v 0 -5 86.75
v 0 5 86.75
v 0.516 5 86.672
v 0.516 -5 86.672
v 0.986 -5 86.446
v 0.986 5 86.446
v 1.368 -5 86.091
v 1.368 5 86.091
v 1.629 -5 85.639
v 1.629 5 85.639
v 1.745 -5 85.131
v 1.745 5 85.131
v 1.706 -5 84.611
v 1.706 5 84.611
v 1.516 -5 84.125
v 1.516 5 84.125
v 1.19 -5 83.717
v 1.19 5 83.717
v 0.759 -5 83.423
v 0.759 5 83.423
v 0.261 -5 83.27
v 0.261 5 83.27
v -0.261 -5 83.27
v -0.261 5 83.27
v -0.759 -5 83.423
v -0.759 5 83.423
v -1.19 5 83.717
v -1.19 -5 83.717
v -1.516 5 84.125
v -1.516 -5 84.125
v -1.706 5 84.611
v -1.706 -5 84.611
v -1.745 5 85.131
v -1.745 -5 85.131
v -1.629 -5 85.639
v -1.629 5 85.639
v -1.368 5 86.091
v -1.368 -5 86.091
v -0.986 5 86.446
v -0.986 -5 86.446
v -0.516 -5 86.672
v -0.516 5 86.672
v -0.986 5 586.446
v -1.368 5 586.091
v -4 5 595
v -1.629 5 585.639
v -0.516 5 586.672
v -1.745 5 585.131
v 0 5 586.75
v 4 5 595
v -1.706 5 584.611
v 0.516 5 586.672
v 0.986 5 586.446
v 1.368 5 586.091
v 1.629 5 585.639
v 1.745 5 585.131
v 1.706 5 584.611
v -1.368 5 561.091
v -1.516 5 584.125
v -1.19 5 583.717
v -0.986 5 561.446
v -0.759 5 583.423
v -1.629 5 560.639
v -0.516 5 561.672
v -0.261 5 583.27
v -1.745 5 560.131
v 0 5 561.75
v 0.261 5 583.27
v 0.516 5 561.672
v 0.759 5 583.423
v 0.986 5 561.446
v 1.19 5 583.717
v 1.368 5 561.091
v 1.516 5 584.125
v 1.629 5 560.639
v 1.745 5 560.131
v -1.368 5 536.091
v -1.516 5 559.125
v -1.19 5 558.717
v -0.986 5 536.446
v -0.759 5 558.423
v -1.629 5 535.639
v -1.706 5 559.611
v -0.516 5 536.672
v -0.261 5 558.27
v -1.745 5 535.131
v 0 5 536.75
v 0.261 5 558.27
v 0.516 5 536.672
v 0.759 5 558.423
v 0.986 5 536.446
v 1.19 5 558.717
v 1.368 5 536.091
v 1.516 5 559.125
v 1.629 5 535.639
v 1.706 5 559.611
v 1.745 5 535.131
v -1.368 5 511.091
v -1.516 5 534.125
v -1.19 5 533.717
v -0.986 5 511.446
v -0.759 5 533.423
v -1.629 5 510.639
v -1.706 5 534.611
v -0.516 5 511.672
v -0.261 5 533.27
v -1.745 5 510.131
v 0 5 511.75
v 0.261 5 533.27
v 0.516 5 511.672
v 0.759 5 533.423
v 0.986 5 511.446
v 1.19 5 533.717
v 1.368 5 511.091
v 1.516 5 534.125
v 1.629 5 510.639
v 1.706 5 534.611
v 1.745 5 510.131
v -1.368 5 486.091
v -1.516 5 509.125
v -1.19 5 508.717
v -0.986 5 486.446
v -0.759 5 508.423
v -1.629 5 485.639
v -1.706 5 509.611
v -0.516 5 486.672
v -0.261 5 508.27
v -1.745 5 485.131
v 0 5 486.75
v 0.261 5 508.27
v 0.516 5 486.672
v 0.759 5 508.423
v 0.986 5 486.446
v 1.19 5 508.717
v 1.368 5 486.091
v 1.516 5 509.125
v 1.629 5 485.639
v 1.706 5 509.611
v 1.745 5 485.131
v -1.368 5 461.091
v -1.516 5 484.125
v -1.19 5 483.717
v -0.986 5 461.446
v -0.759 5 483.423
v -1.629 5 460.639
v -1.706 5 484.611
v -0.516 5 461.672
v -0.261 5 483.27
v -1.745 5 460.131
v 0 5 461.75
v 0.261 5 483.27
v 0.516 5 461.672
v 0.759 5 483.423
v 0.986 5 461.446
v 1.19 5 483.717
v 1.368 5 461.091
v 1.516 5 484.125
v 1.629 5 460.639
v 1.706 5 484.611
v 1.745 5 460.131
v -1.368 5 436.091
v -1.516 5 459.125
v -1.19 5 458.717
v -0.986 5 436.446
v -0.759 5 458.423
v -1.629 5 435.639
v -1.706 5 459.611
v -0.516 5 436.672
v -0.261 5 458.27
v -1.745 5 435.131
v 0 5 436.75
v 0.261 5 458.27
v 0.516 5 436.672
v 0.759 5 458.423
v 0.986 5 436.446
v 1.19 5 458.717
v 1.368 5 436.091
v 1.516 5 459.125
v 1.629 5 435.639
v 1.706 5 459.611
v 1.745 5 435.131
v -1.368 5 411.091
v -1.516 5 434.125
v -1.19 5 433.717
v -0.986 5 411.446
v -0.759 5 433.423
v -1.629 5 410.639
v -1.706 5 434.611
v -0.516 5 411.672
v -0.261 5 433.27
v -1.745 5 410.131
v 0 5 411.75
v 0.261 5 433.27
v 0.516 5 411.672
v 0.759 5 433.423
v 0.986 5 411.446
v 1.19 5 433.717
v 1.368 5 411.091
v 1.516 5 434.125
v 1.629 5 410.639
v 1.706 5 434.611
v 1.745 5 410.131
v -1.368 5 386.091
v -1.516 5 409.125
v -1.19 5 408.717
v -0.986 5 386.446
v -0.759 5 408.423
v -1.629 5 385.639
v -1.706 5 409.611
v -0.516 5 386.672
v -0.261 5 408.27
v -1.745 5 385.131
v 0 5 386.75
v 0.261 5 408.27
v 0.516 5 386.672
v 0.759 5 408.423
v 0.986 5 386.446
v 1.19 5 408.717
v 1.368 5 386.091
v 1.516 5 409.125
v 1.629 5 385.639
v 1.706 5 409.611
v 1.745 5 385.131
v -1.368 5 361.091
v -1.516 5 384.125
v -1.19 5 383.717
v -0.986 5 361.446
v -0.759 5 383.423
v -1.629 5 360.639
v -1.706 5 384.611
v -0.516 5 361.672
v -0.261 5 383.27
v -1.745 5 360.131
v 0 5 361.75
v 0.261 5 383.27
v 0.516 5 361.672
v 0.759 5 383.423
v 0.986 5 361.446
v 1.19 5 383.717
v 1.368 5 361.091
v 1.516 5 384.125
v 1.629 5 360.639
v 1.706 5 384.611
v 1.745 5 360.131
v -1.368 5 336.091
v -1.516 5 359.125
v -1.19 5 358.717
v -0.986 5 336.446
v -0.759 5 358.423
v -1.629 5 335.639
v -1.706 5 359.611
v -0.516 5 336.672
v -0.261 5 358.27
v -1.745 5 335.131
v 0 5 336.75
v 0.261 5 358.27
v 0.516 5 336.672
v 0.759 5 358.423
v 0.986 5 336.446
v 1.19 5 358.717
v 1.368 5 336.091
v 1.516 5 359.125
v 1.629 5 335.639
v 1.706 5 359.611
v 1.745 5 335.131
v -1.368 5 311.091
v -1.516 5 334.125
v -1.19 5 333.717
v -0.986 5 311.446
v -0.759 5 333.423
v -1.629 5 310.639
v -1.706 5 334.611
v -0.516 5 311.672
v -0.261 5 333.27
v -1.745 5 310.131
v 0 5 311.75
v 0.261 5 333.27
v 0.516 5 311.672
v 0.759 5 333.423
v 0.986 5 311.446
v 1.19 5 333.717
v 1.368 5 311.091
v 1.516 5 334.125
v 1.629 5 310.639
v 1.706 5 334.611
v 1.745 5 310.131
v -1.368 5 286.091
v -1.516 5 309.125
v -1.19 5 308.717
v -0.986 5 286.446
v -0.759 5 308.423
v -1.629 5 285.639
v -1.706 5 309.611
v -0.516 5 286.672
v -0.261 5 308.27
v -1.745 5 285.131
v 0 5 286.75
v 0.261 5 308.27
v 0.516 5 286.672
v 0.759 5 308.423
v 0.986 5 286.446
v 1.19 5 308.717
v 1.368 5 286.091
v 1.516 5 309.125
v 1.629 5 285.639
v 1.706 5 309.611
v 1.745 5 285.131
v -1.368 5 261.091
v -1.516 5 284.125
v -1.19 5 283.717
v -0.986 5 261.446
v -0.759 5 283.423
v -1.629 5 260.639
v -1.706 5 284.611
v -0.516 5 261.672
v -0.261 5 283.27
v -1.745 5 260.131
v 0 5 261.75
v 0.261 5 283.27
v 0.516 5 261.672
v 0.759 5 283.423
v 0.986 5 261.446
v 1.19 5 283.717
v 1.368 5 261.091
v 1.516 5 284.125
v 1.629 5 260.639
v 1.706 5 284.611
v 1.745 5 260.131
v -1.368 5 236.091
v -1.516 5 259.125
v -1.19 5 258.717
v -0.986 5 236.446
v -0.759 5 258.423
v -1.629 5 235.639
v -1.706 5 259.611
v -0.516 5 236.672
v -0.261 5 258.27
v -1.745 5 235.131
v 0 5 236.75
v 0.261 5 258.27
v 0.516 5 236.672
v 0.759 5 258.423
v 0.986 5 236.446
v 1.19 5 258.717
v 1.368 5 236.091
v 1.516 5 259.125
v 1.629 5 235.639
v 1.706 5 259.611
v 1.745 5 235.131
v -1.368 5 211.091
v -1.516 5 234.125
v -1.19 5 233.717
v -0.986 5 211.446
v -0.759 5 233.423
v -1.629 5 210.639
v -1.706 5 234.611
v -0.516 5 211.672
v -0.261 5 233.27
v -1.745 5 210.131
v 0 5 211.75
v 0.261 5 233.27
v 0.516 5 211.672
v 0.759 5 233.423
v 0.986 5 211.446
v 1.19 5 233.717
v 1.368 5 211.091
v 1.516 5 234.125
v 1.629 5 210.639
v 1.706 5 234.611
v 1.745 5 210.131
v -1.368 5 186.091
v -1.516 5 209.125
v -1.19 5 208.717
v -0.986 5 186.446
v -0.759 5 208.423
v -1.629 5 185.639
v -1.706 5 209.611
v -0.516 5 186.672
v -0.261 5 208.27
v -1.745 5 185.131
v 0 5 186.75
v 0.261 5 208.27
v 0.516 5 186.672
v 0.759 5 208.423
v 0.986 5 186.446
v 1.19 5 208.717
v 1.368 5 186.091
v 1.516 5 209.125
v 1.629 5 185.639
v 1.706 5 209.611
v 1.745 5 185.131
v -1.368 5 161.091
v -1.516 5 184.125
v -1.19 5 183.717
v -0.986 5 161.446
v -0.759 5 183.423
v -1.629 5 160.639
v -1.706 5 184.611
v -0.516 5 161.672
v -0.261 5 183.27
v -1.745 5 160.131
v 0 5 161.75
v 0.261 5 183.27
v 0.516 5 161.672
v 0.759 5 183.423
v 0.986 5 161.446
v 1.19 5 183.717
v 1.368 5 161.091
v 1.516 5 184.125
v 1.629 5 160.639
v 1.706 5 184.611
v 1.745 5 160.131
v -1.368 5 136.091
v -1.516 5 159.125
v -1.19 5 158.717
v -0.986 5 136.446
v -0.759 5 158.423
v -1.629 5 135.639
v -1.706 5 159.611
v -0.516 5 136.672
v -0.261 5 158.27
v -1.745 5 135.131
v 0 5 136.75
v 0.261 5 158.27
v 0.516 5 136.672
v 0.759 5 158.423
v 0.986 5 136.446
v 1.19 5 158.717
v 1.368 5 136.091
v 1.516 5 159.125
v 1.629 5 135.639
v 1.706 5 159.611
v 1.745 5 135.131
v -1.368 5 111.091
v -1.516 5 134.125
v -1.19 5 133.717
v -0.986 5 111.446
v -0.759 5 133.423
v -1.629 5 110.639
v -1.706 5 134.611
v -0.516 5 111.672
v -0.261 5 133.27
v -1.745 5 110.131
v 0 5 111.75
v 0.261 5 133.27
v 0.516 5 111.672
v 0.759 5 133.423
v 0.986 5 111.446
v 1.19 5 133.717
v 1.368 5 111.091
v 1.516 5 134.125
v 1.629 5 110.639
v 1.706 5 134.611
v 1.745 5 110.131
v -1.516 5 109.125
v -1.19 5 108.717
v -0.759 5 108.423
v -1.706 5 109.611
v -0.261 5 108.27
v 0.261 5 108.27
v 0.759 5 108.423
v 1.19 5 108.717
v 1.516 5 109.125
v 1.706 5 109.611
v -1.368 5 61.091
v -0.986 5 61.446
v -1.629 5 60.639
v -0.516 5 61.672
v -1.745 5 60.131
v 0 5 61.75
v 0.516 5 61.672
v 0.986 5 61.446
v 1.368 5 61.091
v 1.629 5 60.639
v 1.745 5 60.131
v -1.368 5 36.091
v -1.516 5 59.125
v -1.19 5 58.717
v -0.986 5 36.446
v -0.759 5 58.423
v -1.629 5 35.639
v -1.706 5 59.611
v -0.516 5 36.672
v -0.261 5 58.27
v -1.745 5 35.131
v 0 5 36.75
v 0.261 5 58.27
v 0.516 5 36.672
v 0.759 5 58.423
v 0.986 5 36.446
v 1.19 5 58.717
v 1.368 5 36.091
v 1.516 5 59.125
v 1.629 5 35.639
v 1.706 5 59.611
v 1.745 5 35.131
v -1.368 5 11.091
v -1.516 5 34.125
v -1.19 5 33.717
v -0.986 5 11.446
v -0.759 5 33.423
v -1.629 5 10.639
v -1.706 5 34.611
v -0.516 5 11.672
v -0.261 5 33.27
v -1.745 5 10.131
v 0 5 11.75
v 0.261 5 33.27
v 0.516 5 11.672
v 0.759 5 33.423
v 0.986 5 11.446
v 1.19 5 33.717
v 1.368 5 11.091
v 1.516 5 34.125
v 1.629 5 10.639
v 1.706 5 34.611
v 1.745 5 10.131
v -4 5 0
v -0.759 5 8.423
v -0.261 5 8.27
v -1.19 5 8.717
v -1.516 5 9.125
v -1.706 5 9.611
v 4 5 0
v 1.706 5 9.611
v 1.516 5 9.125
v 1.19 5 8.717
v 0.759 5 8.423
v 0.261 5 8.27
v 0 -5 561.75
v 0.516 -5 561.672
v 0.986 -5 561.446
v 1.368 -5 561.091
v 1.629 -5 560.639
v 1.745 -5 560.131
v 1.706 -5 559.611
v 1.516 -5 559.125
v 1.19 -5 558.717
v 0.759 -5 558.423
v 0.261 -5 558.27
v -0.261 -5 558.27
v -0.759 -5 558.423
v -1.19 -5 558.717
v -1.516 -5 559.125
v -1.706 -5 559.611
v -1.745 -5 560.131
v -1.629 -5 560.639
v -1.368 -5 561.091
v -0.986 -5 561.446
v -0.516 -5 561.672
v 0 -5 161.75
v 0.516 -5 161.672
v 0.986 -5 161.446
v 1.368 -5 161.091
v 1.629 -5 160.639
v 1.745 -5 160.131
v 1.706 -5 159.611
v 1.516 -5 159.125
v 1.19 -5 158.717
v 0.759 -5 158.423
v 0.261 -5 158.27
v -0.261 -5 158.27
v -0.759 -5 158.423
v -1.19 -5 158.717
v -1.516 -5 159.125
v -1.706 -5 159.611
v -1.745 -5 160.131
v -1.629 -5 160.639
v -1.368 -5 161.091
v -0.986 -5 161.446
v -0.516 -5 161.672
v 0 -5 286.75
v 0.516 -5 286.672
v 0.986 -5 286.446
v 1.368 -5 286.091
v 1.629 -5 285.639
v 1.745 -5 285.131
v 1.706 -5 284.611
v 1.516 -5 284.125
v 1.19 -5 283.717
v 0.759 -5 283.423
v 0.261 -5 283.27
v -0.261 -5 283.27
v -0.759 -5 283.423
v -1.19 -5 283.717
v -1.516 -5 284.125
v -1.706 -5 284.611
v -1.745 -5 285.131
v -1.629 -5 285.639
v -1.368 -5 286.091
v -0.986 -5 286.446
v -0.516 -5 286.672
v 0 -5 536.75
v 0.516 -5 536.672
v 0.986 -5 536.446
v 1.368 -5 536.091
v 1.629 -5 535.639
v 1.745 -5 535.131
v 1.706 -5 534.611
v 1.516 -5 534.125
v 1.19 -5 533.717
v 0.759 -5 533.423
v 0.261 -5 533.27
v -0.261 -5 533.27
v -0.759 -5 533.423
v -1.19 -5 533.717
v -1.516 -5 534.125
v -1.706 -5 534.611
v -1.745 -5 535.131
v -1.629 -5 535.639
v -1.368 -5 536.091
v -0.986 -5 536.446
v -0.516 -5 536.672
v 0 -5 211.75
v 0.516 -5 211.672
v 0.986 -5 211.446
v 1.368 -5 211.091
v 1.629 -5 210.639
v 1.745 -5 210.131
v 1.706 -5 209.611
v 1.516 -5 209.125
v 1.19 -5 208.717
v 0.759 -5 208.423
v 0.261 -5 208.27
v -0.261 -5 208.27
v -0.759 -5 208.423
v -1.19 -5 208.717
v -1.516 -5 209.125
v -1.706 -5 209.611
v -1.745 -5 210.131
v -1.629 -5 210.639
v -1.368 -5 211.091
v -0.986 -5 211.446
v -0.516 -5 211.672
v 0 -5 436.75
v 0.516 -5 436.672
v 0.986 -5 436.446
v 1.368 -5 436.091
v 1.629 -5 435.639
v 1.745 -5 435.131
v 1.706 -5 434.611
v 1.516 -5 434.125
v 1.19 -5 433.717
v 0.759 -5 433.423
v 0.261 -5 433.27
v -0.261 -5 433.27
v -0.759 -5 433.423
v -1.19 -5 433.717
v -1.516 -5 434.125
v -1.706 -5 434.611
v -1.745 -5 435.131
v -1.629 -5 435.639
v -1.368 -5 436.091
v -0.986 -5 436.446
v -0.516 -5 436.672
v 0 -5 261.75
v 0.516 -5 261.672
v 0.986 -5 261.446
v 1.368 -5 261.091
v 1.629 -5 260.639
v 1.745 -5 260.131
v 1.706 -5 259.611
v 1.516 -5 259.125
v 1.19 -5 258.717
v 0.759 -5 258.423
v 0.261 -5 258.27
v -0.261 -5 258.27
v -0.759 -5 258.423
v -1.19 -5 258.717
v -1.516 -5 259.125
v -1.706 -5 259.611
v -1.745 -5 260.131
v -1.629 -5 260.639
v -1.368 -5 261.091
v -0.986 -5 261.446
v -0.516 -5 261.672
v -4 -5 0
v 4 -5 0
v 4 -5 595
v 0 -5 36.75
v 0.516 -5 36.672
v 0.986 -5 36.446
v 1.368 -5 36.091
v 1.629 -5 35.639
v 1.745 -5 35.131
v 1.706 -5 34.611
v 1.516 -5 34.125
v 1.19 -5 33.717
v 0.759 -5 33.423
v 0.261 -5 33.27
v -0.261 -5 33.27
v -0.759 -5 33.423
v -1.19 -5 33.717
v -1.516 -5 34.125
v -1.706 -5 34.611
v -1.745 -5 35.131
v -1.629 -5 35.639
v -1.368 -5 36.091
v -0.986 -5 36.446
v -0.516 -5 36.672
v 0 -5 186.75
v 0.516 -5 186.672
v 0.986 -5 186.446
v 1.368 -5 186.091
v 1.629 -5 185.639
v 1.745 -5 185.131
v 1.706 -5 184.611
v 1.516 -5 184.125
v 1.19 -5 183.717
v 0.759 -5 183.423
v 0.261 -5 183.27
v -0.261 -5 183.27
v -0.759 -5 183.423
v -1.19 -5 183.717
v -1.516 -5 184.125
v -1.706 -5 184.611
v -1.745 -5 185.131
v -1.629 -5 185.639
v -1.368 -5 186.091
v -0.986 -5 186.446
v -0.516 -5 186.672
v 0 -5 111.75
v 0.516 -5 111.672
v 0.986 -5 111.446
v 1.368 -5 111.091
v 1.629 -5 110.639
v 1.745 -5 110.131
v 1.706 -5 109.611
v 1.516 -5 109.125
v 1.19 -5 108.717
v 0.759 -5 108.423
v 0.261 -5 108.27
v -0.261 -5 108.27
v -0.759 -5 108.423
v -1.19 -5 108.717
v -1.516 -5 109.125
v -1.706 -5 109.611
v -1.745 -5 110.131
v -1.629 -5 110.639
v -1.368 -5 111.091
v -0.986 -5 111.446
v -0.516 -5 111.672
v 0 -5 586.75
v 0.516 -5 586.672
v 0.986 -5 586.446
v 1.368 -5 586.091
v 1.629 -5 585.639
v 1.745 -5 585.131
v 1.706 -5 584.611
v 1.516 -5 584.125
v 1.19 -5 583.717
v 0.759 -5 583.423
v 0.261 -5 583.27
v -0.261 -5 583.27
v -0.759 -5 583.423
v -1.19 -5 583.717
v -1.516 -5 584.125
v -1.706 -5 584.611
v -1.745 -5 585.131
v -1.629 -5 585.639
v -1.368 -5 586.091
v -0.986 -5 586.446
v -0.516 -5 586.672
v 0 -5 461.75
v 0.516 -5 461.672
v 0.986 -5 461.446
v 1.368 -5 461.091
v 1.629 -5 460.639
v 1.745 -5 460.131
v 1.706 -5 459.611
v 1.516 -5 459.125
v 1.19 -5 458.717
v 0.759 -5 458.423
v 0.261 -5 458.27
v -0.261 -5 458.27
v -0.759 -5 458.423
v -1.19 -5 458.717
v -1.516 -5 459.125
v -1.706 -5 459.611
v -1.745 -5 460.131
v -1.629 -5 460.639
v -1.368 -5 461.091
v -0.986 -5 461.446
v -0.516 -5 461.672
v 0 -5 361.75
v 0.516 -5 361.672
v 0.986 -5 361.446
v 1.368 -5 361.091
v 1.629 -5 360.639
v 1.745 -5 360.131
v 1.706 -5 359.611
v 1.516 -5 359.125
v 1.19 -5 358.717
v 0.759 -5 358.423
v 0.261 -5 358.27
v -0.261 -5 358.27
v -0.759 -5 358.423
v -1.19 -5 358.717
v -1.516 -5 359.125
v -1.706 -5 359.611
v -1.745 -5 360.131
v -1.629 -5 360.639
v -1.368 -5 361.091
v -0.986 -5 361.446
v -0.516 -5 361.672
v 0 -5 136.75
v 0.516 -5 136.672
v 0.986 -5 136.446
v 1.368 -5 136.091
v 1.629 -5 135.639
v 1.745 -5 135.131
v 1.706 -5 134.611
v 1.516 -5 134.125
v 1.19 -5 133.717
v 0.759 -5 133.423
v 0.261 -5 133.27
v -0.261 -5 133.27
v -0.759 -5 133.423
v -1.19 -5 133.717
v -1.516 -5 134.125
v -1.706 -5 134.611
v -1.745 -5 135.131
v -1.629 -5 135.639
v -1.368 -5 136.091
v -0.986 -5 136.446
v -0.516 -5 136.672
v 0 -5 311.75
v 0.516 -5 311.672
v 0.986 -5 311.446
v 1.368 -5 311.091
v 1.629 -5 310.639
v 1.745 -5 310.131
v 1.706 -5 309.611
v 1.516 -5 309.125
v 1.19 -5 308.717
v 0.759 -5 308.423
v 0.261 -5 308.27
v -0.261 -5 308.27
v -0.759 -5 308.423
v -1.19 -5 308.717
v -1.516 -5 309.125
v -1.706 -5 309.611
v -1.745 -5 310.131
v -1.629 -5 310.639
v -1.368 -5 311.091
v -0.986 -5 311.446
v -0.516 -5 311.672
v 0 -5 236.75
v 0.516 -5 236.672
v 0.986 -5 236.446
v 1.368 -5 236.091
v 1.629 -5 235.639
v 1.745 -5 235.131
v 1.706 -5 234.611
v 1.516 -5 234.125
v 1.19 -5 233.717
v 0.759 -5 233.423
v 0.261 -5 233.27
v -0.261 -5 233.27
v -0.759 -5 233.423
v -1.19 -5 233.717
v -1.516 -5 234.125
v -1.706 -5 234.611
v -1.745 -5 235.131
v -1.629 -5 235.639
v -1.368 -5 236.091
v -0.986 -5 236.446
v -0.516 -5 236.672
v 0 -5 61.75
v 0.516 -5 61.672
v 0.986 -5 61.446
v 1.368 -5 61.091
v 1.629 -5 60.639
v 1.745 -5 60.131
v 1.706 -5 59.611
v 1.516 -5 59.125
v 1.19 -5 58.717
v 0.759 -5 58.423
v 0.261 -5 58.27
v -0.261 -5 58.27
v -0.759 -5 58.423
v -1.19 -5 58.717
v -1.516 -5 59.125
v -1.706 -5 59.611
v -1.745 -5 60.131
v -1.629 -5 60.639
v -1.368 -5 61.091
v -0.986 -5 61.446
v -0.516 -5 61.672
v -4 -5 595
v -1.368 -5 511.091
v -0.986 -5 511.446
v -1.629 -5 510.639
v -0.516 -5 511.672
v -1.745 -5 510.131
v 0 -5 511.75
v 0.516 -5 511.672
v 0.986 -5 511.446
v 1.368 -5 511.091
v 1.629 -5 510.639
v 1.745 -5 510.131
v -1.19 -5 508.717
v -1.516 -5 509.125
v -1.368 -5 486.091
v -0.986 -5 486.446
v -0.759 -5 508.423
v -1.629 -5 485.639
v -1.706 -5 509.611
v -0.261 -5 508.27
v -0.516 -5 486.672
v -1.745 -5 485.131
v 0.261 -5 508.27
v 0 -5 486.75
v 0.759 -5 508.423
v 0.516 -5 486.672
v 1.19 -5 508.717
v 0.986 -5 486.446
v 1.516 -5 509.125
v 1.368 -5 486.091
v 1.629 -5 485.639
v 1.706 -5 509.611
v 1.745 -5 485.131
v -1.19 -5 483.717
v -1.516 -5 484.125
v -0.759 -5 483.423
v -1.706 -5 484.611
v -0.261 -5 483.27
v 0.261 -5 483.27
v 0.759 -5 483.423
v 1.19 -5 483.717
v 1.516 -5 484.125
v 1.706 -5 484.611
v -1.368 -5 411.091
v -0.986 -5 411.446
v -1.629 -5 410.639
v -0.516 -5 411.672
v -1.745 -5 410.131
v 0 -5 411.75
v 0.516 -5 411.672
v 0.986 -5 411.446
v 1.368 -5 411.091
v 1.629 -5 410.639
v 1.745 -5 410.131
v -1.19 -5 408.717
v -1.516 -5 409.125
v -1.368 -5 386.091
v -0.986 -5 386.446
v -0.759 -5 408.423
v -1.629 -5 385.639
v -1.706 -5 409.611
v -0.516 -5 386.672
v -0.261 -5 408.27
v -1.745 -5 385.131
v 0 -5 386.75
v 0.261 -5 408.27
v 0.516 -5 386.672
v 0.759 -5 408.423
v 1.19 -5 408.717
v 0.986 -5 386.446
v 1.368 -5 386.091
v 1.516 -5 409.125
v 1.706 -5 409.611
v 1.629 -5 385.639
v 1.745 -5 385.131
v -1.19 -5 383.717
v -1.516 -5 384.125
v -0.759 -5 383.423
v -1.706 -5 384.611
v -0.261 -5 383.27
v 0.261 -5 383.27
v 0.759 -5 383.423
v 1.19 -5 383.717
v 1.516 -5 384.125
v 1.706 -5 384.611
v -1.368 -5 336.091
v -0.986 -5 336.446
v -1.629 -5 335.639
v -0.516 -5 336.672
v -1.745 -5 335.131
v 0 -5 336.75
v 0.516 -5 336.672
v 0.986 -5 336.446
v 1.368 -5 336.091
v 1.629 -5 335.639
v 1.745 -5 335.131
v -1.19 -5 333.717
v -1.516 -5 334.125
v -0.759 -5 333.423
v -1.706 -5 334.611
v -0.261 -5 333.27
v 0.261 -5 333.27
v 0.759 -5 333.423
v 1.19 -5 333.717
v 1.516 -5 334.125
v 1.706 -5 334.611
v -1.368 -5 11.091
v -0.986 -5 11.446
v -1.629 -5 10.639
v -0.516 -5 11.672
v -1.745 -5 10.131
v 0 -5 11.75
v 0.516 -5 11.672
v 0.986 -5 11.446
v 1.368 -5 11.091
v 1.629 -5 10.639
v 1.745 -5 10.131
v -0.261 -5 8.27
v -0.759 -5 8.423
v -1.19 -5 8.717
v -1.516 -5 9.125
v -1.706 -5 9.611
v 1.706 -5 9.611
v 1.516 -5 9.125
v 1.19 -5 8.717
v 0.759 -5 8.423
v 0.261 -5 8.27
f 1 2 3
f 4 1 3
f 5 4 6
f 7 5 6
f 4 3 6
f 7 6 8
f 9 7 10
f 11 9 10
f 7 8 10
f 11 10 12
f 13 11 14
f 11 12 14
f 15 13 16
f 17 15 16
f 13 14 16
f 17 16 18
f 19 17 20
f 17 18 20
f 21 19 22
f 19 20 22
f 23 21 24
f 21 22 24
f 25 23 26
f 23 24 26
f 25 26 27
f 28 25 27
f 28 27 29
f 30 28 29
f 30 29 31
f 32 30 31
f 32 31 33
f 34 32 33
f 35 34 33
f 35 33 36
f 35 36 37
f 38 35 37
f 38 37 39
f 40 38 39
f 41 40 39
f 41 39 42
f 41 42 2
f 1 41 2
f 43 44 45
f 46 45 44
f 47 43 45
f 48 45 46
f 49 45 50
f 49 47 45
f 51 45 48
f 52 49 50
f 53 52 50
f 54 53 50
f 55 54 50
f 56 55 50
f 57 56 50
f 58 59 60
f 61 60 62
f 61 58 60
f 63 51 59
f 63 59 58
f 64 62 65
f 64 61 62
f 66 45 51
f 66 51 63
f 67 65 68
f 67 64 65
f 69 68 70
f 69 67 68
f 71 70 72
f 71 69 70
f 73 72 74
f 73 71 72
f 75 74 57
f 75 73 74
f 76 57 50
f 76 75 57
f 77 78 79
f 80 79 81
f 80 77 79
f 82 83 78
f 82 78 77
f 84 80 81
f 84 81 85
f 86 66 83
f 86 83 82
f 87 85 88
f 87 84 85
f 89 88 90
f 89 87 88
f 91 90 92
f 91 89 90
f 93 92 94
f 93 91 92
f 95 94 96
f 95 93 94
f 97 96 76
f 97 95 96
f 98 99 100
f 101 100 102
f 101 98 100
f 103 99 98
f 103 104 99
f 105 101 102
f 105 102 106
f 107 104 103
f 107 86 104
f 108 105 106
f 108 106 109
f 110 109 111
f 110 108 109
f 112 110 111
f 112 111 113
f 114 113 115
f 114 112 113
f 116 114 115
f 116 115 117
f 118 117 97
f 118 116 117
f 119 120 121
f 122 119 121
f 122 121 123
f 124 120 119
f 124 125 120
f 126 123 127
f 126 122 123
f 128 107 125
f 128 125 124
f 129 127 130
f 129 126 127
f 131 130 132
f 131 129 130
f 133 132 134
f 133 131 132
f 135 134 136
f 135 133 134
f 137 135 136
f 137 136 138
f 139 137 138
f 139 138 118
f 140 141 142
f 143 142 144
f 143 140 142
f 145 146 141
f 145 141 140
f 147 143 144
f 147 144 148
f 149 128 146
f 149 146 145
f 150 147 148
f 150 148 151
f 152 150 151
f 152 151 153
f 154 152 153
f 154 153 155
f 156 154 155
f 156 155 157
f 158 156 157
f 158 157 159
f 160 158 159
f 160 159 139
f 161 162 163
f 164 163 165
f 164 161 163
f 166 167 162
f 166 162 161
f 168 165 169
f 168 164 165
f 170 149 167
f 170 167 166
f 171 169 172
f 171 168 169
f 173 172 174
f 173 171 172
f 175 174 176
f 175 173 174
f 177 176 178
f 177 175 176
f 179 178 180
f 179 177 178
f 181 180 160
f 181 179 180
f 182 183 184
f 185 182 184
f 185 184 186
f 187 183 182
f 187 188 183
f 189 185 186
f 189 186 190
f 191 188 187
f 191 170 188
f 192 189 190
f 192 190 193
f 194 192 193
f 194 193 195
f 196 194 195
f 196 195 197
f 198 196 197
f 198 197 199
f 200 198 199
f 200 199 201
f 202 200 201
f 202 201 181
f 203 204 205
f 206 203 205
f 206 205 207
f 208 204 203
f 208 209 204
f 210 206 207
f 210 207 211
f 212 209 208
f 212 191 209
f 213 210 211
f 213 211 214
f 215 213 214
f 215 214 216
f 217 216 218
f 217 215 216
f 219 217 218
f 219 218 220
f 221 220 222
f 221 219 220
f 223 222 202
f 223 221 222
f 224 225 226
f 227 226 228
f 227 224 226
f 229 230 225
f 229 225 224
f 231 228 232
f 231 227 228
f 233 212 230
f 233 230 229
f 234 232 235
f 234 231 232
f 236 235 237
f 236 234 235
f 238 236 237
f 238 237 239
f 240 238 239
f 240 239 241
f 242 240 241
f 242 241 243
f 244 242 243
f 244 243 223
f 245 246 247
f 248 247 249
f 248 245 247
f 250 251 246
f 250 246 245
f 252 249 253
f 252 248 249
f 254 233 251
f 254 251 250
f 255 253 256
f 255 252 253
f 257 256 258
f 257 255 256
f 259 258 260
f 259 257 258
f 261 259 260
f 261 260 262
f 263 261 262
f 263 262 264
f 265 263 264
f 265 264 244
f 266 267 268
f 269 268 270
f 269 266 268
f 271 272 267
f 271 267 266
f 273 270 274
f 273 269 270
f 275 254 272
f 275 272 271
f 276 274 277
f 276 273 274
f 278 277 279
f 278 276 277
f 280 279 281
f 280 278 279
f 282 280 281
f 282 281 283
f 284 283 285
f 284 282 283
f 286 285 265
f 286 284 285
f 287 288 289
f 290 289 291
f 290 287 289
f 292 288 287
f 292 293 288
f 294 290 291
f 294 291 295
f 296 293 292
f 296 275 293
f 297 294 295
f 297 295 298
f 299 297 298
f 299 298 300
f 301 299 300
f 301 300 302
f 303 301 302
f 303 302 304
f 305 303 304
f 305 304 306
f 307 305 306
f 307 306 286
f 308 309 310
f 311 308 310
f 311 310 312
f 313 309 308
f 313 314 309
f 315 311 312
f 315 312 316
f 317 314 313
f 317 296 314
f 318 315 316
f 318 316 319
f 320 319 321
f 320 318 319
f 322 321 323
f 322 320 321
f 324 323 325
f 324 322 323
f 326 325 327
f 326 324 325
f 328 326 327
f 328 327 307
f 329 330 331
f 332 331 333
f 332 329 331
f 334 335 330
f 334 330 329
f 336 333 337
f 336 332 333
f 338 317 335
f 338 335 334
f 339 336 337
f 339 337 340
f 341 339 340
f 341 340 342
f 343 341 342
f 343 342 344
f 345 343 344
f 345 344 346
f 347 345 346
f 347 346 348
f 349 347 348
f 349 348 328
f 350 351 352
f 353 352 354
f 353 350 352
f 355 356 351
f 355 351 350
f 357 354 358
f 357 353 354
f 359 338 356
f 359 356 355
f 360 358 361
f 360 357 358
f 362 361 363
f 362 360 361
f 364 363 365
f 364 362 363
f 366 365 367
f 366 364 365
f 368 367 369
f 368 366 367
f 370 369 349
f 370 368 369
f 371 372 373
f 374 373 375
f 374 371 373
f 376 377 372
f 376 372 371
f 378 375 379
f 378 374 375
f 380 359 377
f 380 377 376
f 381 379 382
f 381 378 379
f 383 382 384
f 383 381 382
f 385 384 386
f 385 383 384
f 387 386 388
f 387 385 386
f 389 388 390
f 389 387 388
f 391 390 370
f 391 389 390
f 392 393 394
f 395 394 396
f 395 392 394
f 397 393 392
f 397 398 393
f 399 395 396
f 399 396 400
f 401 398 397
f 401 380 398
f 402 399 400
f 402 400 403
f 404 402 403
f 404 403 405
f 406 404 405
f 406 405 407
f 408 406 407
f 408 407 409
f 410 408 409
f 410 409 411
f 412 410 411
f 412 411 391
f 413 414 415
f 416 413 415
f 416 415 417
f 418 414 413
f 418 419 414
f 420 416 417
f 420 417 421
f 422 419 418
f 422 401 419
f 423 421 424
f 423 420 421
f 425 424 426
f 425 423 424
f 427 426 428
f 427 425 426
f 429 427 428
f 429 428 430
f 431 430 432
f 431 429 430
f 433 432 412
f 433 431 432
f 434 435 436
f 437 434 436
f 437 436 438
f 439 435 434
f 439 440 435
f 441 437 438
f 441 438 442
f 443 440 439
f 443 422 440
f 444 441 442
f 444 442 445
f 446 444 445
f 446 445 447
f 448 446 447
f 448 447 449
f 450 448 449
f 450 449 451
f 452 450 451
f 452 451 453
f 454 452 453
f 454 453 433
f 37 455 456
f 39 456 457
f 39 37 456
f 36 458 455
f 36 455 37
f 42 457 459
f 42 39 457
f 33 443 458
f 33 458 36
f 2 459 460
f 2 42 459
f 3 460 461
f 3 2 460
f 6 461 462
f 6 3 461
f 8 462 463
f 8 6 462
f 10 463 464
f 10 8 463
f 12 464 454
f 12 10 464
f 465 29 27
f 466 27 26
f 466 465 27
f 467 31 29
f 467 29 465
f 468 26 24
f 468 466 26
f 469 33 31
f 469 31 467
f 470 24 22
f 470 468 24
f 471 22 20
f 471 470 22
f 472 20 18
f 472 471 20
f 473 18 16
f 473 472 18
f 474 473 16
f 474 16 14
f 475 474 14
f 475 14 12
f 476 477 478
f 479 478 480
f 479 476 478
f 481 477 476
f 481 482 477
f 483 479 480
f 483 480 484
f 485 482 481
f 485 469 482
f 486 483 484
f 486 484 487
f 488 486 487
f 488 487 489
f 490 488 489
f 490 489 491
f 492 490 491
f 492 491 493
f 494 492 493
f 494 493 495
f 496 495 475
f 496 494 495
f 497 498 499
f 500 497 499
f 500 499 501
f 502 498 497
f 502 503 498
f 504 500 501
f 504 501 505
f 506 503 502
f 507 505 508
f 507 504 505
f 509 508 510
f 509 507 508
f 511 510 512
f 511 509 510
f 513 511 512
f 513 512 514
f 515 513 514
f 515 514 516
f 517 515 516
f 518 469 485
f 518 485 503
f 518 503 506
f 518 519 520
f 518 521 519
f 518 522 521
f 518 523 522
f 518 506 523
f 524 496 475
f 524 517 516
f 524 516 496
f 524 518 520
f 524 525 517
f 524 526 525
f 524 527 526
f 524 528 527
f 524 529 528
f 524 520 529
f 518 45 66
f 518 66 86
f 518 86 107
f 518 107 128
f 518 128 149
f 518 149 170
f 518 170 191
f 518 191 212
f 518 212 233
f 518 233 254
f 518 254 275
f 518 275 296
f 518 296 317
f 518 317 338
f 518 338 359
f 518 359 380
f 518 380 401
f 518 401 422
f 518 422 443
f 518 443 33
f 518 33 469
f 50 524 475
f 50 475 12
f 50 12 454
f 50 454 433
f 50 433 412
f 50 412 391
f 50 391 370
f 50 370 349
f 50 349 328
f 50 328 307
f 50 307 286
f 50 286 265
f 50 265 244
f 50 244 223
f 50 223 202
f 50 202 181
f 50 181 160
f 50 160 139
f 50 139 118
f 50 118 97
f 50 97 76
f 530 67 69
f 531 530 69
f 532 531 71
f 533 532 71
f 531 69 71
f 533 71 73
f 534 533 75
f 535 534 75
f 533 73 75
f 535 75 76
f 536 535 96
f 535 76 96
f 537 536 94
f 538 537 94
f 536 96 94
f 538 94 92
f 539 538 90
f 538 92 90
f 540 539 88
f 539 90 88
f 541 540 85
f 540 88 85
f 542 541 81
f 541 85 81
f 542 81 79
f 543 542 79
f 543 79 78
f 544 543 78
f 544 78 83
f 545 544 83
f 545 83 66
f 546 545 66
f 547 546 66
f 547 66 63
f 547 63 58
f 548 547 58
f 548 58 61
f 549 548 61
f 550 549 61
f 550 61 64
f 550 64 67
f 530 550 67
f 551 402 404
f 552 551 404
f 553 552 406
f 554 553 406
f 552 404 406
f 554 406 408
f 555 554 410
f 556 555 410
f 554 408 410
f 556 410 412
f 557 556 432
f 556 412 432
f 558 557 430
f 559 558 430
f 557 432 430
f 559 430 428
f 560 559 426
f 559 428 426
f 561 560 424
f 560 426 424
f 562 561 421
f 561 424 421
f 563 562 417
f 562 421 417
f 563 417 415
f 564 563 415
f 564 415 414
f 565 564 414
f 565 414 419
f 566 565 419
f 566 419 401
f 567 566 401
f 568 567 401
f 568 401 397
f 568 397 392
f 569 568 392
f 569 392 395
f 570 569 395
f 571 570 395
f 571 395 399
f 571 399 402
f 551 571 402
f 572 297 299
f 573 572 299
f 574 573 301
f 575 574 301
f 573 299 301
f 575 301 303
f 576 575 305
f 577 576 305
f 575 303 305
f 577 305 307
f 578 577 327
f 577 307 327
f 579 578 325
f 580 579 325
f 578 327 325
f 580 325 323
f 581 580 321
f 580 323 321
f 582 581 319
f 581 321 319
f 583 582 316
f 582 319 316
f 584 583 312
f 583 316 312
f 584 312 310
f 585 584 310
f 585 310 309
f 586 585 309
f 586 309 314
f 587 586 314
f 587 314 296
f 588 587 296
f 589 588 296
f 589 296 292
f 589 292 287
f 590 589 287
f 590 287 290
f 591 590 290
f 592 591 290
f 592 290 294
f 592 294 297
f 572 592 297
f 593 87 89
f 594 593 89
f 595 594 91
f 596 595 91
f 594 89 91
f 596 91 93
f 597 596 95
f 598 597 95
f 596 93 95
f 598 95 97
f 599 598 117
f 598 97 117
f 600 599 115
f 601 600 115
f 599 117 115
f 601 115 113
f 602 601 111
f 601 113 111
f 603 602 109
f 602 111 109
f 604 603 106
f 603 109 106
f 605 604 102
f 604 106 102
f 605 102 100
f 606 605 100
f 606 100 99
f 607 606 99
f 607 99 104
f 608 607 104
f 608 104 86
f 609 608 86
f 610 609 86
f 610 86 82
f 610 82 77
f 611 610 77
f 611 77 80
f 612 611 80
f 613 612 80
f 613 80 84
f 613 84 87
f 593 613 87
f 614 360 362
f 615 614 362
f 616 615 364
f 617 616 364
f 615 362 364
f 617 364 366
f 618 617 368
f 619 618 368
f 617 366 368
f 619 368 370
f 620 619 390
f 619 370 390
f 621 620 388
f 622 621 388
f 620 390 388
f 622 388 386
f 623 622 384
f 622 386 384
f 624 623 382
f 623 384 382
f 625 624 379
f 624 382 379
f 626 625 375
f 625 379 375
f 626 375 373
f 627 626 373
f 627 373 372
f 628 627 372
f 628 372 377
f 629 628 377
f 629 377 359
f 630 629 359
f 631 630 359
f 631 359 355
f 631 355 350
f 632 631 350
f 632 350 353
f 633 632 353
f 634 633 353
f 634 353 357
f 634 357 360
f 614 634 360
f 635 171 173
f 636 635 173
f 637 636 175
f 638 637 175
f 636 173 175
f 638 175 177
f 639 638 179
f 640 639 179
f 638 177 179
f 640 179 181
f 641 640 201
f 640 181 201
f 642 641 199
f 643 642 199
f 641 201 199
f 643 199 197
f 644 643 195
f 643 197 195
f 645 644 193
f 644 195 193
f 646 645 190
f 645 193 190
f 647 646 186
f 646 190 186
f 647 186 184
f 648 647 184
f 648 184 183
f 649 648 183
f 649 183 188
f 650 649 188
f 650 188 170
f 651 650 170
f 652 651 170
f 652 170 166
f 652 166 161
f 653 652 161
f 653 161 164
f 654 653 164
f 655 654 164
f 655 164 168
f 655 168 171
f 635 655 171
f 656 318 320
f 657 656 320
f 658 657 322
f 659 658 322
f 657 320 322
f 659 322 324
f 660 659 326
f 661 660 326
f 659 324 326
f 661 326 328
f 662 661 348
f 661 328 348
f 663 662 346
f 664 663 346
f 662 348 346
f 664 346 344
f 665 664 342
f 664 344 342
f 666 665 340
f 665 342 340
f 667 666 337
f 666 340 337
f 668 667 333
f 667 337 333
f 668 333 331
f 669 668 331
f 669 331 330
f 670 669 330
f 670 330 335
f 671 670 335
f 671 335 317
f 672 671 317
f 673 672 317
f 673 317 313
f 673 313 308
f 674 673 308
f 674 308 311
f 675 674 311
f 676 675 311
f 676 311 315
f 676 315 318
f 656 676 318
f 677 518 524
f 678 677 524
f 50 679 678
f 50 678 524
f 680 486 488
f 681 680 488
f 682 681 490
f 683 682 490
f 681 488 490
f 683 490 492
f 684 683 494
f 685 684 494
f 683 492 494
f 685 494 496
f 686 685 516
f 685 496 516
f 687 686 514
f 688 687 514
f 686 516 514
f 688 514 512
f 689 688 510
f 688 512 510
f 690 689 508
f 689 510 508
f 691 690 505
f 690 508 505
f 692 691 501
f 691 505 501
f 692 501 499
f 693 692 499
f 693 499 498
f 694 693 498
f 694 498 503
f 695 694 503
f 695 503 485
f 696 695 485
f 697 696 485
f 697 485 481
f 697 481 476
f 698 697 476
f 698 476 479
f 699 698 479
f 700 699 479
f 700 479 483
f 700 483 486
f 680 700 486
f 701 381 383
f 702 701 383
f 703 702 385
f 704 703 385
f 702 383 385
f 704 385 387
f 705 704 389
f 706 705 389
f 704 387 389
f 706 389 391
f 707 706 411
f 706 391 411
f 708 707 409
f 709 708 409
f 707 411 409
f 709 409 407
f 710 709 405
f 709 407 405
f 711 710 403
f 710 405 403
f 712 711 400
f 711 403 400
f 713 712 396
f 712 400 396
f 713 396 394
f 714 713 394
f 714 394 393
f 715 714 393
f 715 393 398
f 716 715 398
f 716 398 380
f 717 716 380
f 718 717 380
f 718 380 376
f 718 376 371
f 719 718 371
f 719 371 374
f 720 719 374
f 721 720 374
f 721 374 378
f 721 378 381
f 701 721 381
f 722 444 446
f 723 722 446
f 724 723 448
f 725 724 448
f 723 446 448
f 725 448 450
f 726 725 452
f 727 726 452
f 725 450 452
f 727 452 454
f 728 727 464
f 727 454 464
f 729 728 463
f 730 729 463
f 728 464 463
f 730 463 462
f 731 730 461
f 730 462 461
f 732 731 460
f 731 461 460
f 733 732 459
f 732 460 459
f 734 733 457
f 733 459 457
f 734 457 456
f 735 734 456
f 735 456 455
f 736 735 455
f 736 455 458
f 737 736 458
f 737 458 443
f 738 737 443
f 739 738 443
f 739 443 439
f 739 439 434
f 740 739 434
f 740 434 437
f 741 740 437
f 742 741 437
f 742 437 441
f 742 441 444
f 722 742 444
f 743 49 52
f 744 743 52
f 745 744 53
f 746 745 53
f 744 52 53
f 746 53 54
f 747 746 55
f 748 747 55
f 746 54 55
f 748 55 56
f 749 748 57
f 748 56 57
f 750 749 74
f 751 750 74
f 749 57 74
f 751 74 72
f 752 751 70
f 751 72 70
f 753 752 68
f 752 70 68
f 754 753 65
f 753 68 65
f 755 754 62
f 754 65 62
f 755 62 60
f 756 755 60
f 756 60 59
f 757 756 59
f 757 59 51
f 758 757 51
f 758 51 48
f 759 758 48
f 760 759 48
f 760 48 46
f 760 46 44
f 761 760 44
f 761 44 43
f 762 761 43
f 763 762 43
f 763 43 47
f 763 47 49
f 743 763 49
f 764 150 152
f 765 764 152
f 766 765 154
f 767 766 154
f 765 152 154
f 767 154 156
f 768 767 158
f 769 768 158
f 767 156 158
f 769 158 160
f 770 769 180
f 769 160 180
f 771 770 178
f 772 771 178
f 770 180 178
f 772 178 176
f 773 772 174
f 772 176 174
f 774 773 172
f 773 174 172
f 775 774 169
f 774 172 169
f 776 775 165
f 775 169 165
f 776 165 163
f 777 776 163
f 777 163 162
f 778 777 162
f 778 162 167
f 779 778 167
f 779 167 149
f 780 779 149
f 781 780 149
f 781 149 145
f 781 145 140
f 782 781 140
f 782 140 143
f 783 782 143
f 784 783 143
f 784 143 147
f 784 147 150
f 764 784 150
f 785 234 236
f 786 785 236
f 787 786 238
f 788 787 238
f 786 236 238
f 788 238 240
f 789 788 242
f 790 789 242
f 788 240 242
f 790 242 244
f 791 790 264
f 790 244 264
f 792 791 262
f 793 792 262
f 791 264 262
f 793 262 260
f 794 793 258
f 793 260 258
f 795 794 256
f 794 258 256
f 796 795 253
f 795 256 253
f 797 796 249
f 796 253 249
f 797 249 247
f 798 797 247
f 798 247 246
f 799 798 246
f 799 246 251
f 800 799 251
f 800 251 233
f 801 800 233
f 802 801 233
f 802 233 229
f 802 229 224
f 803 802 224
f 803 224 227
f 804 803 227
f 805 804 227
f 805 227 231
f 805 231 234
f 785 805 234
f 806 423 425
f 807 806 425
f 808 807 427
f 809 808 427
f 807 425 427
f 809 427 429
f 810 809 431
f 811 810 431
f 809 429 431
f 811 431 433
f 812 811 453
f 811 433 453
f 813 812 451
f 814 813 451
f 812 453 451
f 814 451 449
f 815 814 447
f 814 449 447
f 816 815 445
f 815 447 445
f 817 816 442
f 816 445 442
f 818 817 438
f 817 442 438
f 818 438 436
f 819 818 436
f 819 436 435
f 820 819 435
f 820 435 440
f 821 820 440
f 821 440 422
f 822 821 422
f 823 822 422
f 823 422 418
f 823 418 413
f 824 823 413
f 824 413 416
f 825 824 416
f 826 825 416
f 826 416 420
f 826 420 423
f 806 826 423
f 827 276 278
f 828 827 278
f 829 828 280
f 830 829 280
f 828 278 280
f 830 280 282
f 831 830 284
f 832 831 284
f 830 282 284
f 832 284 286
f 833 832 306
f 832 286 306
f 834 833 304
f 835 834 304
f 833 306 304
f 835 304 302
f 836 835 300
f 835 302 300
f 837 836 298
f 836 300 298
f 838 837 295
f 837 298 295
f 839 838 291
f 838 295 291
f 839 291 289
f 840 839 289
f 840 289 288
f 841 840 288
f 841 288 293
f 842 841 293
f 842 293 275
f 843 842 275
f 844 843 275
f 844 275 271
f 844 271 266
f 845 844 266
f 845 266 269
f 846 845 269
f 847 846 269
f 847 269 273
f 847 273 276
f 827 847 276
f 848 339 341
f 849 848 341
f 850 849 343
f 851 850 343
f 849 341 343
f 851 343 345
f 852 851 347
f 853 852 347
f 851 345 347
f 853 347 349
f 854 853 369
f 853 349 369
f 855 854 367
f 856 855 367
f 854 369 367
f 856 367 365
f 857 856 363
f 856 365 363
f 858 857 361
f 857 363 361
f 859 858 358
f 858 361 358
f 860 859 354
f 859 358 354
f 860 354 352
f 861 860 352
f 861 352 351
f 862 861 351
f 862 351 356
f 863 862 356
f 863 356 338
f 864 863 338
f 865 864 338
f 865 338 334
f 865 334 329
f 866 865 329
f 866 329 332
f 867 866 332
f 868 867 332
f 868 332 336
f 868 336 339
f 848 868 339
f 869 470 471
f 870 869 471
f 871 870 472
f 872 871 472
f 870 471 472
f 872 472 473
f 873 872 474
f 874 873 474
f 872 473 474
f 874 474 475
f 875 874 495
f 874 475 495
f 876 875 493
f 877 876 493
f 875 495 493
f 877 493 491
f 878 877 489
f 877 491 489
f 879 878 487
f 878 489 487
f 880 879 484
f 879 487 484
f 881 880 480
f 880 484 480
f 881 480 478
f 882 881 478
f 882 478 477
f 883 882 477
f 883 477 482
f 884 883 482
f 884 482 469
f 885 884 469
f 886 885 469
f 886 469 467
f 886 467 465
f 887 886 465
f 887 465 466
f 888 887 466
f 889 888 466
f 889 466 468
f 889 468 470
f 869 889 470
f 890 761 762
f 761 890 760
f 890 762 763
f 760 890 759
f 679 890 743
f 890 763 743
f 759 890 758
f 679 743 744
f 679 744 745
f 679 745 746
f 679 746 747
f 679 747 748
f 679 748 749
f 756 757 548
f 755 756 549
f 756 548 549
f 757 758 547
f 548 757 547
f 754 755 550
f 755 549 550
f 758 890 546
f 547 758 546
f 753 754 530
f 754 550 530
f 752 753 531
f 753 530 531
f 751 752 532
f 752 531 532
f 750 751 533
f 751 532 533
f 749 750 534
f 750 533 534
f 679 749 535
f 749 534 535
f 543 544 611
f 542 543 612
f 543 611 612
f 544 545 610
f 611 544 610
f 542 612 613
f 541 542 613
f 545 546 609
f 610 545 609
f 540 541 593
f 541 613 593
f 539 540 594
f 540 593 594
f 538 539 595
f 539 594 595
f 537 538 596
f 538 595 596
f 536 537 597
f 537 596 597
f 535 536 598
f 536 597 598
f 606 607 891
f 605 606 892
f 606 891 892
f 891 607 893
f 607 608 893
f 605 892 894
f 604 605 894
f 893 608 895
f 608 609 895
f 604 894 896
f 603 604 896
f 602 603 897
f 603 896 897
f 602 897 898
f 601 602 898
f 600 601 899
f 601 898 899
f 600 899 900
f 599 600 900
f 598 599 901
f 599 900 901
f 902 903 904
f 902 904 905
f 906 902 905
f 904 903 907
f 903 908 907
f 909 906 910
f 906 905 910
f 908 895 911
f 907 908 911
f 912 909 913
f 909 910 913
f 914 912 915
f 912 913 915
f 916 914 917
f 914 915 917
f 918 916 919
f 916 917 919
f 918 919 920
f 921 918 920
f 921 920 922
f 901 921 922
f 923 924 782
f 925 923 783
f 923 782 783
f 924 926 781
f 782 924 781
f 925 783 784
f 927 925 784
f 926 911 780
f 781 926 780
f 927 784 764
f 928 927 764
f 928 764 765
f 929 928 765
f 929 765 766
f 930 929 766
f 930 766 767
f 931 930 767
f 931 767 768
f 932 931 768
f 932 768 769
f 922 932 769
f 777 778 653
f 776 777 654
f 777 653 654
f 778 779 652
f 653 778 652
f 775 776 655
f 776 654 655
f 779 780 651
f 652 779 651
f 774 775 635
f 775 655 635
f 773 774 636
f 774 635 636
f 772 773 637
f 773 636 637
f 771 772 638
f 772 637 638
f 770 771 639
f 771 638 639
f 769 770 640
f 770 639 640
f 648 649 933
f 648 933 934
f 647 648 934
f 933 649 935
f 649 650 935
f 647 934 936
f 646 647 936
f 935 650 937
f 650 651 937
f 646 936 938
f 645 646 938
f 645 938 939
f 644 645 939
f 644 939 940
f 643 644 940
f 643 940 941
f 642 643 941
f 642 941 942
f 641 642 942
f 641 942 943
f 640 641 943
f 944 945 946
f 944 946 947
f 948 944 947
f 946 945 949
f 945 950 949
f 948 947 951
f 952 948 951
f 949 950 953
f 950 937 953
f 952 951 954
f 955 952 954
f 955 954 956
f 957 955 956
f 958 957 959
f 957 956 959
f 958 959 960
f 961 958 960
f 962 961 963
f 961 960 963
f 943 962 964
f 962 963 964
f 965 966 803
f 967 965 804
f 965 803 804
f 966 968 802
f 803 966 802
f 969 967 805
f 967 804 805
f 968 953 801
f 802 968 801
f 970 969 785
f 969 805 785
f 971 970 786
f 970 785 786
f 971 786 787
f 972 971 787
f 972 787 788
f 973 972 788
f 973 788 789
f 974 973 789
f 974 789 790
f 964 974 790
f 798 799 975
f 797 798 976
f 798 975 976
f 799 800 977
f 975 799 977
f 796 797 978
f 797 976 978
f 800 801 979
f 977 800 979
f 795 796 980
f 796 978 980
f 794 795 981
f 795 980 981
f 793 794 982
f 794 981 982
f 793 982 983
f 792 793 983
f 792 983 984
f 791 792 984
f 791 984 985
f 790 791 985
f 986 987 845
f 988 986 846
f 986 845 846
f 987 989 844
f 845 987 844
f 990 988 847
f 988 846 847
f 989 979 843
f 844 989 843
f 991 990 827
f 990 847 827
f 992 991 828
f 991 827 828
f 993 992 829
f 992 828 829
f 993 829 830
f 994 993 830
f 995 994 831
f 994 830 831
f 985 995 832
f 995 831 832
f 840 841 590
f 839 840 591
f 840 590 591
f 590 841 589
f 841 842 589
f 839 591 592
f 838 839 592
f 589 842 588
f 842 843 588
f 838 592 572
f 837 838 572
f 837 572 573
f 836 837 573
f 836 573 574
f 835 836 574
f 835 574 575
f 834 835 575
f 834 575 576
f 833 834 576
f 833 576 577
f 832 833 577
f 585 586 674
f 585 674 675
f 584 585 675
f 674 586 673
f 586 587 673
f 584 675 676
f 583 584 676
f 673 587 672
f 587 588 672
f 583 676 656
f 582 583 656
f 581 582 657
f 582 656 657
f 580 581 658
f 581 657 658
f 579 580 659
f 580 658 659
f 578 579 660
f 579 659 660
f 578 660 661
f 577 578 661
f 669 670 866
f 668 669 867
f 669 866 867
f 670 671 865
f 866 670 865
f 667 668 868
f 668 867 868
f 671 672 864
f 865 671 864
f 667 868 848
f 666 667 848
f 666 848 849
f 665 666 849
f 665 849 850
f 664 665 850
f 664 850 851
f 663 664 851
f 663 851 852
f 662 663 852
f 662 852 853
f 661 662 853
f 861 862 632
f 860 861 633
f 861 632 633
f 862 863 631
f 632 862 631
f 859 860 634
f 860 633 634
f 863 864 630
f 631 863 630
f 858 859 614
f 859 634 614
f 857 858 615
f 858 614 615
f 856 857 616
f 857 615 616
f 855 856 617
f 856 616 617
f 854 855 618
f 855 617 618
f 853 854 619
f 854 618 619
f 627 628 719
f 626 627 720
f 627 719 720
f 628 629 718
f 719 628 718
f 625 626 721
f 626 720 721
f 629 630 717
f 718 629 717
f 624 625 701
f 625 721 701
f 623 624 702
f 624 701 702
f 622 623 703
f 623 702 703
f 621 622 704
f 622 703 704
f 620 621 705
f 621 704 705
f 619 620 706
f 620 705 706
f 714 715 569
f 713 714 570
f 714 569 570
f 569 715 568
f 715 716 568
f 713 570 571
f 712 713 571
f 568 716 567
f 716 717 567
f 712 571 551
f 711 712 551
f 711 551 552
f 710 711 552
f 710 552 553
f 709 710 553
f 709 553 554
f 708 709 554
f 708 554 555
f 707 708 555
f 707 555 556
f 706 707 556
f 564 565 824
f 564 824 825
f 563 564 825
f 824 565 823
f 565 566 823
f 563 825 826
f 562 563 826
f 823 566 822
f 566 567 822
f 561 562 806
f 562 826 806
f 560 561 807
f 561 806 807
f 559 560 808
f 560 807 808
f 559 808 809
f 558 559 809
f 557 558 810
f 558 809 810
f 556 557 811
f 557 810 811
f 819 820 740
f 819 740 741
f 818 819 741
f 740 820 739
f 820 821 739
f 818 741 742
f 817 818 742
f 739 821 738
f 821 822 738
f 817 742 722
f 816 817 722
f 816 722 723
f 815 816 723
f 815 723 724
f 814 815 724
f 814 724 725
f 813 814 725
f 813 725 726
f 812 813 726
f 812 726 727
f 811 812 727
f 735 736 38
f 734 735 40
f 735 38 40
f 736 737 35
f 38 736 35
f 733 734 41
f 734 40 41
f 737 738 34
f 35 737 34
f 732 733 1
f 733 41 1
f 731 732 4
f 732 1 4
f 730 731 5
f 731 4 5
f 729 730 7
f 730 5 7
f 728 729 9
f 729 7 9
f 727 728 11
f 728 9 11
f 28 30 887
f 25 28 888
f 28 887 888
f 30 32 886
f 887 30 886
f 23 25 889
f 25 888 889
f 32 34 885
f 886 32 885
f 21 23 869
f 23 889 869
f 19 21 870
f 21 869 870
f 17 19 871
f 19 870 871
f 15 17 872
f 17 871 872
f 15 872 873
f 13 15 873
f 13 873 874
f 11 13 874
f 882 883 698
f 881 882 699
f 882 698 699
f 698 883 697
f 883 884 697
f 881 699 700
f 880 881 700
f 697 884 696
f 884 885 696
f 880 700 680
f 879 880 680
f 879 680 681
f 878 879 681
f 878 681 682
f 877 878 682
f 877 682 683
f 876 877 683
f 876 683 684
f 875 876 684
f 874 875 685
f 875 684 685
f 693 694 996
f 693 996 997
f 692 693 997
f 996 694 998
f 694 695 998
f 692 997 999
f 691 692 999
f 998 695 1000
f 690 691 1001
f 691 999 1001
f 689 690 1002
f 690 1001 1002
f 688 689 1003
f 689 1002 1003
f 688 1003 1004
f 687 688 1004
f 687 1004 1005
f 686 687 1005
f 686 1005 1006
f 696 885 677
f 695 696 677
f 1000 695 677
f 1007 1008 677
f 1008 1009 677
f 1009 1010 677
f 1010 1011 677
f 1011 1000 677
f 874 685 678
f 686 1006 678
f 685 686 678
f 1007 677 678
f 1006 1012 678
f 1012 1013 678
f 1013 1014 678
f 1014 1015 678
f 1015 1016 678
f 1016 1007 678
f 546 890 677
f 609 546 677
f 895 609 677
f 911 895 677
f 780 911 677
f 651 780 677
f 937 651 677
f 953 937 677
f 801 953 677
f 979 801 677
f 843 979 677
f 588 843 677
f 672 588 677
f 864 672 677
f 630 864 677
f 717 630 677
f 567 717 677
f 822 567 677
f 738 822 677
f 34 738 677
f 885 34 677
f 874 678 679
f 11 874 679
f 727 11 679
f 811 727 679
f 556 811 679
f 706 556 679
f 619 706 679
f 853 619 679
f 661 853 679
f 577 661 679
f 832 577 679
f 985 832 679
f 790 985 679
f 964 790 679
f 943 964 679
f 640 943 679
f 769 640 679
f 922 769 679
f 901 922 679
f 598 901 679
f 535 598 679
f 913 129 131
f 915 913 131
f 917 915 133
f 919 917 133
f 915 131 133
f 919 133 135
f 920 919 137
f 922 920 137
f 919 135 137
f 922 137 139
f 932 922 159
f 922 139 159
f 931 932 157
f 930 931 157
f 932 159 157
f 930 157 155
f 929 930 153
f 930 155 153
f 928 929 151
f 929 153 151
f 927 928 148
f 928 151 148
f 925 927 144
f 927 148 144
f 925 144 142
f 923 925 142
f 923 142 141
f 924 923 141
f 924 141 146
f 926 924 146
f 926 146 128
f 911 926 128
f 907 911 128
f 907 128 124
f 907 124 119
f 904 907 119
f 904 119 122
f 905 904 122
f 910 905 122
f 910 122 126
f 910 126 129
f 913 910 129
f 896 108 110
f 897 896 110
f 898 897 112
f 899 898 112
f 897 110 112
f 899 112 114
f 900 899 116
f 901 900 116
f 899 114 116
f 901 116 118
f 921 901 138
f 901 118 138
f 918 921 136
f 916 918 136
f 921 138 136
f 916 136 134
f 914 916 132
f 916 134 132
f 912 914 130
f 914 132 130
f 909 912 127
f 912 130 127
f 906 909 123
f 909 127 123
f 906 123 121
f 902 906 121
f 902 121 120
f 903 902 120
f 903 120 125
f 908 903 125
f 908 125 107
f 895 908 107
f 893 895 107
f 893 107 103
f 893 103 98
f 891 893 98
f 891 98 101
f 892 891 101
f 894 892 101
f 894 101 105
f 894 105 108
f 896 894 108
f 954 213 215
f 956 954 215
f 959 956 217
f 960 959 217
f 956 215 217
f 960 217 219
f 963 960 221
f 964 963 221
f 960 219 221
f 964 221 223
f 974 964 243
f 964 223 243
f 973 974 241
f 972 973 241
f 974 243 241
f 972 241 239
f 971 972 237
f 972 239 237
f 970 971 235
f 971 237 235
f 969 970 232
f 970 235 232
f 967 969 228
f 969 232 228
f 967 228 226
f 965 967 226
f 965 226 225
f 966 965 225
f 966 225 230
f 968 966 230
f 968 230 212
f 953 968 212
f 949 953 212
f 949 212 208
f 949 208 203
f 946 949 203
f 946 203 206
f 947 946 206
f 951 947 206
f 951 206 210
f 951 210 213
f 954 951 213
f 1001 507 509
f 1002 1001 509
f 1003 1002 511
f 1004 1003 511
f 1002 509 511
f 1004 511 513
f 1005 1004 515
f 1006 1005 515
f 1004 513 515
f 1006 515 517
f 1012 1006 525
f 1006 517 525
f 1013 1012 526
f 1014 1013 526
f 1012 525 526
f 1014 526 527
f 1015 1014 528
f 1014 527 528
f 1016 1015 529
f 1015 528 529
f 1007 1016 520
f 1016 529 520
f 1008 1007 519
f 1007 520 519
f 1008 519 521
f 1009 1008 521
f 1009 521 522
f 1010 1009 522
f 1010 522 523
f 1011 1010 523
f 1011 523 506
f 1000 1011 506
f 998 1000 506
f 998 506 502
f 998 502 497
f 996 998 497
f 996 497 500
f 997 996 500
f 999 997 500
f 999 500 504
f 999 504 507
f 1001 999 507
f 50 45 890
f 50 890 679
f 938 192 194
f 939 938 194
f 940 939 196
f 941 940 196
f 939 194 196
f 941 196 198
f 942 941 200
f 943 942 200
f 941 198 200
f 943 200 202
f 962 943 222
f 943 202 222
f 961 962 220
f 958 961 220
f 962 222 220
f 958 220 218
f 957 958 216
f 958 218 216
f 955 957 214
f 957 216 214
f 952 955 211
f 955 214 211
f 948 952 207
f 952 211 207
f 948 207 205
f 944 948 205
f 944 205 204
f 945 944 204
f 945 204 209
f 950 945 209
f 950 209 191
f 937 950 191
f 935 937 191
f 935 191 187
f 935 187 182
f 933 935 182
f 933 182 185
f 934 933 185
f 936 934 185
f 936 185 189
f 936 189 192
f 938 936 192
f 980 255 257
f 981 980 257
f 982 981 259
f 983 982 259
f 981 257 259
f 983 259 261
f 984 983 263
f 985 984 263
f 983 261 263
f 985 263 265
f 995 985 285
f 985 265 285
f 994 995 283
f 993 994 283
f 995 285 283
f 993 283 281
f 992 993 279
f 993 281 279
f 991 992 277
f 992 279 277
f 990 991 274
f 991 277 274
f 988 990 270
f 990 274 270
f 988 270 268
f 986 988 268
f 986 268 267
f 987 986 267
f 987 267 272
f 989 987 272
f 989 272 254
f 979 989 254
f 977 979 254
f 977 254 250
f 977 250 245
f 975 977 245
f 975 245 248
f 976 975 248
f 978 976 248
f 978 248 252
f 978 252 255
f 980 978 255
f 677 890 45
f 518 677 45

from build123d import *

# Parameters (mm, degrees)
SKETCH1_W           = 8
SKETCH1_H           = 10
BOSS_EXTRUDE1_DEPTH = 595
SKETCH2_R           = 1.75
CUT_EXTRUDE1_DEPTH  = 596.097471008
LPATTERN1_COUNT     = 24
LPATTERN1_PITCH     = 25


with BuildPart() as part:
    # Sketch1 → Boss-Extrude1 (new body)
    with BuildSketch(Plane.XY):
        Rectangle(SKETCH1_W, SKETCH1_H)
    extrude(amount=BOSS_EXTRUDE1_DEPTH)

    # Sketch2 → Cut-Extrude1 (cut, through all)
    with BuildSketch(Plane(origin=(0, 5, 0), x_dir=(1, 0, 0), z_dir=(0, 1, 0))):
        with Locations(Location((0, -10, 0), (0, 0, 270))):
            Circle(SKETCH2_R)
    cut_extrude1 = extrude(amount=-CUT_EXTRUDE1_DEPTH, mode=Mode.SUBTRACT)

    # LPattern1: Cut-Extrude1 ×24
    with Locations(*[(0, 0, i * LPATTERN1_PITCH) for i in range(1, LPATTERN1_COUNT)]):
        add(cut_extrude1, mode=Mode.SUBTRACT)


solid = part.part
